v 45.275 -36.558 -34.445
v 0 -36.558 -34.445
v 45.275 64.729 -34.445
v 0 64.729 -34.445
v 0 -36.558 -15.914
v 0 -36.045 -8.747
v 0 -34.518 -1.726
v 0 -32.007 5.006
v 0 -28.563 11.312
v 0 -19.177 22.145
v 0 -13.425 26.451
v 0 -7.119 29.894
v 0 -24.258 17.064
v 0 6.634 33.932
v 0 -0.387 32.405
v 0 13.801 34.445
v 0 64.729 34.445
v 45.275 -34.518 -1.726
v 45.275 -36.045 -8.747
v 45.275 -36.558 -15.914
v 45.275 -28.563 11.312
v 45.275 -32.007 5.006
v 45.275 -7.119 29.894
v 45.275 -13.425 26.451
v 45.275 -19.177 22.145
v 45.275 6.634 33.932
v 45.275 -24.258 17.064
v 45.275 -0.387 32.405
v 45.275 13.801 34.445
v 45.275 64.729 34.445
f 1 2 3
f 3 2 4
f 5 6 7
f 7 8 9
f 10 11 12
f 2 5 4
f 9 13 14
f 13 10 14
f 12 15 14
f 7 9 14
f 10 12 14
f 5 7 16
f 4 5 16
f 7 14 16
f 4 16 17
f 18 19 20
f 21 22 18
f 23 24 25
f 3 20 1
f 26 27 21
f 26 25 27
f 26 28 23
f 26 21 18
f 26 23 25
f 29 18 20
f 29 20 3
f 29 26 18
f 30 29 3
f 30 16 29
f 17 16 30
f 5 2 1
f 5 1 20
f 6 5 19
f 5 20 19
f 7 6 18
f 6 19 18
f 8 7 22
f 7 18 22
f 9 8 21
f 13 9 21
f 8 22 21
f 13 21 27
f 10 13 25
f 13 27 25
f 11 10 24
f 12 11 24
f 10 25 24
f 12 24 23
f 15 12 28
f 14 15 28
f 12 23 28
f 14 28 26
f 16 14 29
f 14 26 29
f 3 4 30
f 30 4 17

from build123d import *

# Parameters (mm, degrees)
F0_W     = 101.286828
F0_H     = 68.889946
F1_DEPTH = 45.275418
F2_R     = 50.358539


with BuildPart() as f1:
    # F0 (on Right) → F1 (new body)
    with BuildSketch(Plane.YZ):
        with Locations((14.08571, 0)):
            Rectangle(F0_W, F0_H)
    extrude(amount=F1_DEPTH)

    # F2
    f2_edges = [f1.edges().sort_by_distance(p)[0] for p in [
        (22.637709, -36.557704, 34.444973),
    ]]
    fillet(f2_edges, radius=F2_R)


solid = f1.part
